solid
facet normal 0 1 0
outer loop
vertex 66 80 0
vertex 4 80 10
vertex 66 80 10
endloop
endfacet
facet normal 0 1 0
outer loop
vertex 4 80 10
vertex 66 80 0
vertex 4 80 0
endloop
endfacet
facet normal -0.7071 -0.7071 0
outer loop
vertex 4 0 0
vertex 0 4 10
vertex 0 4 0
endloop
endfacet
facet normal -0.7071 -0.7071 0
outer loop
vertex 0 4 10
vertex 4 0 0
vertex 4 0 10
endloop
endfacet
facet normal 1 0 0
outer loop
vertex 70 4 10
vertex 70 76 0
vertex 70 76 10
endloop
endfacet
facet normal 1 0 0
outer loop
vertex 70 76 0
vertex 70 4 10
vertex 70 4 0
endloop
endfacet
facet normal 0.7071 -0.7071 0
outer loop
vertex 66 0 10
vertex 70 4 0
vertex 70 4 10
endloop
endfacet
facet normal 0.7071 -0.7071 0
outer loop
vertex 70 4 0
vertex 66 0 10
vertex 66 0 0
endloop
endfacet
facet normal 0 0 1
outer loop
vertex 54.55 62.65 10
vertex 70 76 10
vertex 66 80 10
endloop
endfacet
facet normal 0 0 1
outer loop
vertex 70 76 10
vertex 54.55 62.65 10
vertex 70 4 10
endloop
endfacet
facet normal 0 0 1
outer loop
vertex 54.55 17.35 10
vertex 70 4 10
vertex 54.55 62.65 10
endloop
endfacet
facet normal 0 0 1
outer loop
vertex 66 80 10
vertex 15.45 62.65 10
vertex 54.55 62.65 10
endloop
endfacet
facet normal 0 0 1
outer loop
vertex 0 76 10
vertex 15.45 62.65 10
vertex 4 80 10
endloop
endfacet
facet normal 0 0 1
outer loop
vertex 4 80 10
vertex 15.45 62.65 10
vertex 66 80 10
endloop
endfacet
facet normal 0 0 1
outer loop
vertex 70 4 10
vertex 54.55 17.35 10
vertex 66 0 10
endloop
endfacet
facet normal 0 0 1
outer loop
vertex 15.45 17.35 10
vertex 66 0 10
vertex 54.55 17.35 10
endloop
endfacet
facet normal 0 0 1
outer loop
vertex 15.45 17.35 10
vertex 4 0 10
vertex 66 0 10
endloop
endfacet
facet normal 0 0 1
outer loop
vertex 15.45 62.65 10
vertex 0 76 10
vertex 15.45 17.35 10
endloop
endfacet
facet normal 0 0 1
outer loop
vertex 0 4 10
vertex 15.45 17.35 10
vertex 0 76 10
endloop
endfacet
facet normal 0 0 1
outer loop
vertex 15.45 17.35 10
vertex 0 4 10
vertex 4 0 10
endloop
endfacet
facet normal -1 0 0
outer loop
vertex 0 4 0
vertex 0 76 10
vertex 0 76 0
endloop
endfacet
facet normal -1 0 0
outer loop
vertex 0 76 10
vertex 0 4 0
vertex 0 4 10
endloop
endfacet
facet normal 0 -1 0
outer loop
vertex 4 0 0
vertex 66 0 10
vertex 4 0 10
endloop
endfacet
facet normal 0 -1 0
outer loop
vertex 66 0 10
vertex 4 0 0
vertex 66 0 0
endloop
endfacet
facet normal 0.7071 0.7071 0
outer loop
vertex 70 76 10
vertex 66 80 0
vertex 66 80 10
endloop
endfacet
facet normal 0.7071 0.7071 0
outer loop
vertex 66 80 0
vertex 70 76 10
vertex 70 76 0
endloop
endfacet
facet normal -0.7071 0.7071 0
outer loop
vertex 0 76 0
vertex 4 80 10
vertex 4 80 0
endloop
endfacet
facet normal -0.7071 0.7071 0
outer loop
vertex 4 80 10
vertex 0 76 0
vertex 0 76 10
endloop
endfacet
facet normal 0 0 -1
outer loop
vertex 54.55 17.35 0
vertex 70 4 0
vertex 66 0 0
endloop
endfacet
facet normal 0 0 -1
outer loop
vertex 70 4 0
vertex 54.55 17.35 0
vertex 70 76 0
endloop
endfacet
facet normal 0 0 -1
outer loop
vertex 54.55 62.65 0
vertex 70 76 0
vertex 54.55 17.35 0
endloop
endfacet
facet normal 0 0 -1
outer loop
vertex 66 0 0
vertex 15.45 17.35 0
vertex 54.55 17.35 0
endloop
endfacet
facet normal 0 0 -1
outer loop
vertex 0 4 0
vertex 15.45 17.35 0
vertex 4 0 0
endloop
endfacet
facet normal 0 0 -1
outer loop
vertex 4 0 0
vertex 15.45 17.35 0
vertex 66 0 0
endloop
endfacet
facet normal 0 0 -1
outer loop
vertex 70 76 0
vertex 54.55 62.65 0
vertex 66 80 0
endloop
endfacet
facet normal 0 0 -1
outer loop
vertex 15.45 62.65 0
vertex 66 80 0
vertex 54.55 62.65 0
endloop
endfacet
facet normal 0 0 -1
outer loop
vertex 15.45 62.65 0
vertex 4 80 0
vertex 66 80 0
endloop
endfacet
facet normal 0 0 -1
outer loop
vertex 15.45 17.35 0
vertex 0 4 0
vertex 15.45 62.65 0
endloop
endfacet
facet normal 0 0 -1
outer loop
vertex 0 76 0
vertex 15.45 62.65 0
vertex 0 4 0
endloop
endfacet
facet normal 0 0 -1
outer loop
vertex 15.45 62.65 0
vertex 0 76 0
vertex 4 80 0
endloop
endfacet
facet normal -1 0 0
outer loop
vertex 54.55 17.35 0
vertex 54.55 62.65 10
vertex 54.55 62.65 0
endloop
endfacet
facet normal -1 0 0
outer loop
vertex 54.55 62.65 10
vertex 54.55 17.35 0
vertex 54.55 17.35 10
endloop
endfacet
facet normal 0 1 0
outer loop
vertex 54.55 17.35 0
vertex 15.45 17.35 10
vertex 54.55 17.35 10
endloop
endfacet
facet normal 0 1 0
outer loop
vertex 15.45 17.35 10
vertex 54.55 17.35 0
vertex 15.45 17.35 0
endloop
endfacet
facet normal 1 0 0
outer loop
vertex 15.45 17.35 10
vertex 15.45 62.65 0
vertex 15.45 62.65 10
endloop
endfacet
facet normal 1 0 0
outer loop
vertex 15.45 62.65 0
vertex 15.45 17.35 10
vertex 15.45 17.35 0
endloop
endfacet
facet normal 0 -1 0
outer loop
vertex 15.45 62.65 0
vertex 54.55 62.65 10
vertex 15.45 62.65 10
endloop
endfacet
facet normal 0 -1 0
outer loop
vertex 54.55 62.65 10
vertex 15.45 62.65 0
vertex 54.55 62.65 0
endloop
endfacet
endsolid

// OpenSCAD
$fn = 32;

// ----------------------------------------------------------------------
// Windowed plate: 1 voids, 70 x 80 x 10 mm
// ----------------------------------------------------------------------

// --- parameters (mm) ---
plate_l = 70;             // plate length, X
plate_w = 80;             // plate width, Y
plate_t = 10;             // plate thickness, Z
edge_margin = 12;         // wall from the plate edge to any window
win1_l = 39.1;            // window length
win1_w = 45.3;            // window width
depth_1 = 10;             // depth of void 1 (full thickness = through)
corner_c = 4;             // corner chamfer of the plate

profile = [[4, 0], [66, 0], [70, 4], [70, 76], [66, 80], [4, 80], [0, 76], [0, 4]];  // primary outline, 8 points, counter clockwise
void_1 = [[15.45, 17.35], [54.55, 17.35], [54.55, 62.65], [15.45, 62.65]];  // large central window, 4 points

// --- the one profile operation ---
difference() {
  linear_extrude(height = plate_t) polygon(points = profile);
  translate([0, 0, -1])
    linear_extrude(height = plate_t + 2) polygon(points = void_1);
}
